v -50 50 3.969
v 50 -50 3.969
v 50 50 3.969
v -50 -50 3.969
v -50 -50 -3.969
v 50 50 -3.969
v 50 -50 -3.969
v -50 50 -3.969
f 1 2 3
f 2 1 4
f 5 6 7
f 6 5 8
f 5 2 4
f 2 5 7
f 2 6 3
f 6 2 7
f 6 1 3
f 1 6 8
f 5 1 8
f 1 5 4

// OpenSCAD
$fn=64;

inch = 25.4;
thickness = 5/16 * inch;  // 0.3125 in
sheet_x = 100;
sheet_y = 100;

module sheet(x=sheet_x, y=sheet_y, t=thickness){
    translate([-x/2, -y/2, -t/2])
        cube([x, y, t], center=false);
}

sheet();
